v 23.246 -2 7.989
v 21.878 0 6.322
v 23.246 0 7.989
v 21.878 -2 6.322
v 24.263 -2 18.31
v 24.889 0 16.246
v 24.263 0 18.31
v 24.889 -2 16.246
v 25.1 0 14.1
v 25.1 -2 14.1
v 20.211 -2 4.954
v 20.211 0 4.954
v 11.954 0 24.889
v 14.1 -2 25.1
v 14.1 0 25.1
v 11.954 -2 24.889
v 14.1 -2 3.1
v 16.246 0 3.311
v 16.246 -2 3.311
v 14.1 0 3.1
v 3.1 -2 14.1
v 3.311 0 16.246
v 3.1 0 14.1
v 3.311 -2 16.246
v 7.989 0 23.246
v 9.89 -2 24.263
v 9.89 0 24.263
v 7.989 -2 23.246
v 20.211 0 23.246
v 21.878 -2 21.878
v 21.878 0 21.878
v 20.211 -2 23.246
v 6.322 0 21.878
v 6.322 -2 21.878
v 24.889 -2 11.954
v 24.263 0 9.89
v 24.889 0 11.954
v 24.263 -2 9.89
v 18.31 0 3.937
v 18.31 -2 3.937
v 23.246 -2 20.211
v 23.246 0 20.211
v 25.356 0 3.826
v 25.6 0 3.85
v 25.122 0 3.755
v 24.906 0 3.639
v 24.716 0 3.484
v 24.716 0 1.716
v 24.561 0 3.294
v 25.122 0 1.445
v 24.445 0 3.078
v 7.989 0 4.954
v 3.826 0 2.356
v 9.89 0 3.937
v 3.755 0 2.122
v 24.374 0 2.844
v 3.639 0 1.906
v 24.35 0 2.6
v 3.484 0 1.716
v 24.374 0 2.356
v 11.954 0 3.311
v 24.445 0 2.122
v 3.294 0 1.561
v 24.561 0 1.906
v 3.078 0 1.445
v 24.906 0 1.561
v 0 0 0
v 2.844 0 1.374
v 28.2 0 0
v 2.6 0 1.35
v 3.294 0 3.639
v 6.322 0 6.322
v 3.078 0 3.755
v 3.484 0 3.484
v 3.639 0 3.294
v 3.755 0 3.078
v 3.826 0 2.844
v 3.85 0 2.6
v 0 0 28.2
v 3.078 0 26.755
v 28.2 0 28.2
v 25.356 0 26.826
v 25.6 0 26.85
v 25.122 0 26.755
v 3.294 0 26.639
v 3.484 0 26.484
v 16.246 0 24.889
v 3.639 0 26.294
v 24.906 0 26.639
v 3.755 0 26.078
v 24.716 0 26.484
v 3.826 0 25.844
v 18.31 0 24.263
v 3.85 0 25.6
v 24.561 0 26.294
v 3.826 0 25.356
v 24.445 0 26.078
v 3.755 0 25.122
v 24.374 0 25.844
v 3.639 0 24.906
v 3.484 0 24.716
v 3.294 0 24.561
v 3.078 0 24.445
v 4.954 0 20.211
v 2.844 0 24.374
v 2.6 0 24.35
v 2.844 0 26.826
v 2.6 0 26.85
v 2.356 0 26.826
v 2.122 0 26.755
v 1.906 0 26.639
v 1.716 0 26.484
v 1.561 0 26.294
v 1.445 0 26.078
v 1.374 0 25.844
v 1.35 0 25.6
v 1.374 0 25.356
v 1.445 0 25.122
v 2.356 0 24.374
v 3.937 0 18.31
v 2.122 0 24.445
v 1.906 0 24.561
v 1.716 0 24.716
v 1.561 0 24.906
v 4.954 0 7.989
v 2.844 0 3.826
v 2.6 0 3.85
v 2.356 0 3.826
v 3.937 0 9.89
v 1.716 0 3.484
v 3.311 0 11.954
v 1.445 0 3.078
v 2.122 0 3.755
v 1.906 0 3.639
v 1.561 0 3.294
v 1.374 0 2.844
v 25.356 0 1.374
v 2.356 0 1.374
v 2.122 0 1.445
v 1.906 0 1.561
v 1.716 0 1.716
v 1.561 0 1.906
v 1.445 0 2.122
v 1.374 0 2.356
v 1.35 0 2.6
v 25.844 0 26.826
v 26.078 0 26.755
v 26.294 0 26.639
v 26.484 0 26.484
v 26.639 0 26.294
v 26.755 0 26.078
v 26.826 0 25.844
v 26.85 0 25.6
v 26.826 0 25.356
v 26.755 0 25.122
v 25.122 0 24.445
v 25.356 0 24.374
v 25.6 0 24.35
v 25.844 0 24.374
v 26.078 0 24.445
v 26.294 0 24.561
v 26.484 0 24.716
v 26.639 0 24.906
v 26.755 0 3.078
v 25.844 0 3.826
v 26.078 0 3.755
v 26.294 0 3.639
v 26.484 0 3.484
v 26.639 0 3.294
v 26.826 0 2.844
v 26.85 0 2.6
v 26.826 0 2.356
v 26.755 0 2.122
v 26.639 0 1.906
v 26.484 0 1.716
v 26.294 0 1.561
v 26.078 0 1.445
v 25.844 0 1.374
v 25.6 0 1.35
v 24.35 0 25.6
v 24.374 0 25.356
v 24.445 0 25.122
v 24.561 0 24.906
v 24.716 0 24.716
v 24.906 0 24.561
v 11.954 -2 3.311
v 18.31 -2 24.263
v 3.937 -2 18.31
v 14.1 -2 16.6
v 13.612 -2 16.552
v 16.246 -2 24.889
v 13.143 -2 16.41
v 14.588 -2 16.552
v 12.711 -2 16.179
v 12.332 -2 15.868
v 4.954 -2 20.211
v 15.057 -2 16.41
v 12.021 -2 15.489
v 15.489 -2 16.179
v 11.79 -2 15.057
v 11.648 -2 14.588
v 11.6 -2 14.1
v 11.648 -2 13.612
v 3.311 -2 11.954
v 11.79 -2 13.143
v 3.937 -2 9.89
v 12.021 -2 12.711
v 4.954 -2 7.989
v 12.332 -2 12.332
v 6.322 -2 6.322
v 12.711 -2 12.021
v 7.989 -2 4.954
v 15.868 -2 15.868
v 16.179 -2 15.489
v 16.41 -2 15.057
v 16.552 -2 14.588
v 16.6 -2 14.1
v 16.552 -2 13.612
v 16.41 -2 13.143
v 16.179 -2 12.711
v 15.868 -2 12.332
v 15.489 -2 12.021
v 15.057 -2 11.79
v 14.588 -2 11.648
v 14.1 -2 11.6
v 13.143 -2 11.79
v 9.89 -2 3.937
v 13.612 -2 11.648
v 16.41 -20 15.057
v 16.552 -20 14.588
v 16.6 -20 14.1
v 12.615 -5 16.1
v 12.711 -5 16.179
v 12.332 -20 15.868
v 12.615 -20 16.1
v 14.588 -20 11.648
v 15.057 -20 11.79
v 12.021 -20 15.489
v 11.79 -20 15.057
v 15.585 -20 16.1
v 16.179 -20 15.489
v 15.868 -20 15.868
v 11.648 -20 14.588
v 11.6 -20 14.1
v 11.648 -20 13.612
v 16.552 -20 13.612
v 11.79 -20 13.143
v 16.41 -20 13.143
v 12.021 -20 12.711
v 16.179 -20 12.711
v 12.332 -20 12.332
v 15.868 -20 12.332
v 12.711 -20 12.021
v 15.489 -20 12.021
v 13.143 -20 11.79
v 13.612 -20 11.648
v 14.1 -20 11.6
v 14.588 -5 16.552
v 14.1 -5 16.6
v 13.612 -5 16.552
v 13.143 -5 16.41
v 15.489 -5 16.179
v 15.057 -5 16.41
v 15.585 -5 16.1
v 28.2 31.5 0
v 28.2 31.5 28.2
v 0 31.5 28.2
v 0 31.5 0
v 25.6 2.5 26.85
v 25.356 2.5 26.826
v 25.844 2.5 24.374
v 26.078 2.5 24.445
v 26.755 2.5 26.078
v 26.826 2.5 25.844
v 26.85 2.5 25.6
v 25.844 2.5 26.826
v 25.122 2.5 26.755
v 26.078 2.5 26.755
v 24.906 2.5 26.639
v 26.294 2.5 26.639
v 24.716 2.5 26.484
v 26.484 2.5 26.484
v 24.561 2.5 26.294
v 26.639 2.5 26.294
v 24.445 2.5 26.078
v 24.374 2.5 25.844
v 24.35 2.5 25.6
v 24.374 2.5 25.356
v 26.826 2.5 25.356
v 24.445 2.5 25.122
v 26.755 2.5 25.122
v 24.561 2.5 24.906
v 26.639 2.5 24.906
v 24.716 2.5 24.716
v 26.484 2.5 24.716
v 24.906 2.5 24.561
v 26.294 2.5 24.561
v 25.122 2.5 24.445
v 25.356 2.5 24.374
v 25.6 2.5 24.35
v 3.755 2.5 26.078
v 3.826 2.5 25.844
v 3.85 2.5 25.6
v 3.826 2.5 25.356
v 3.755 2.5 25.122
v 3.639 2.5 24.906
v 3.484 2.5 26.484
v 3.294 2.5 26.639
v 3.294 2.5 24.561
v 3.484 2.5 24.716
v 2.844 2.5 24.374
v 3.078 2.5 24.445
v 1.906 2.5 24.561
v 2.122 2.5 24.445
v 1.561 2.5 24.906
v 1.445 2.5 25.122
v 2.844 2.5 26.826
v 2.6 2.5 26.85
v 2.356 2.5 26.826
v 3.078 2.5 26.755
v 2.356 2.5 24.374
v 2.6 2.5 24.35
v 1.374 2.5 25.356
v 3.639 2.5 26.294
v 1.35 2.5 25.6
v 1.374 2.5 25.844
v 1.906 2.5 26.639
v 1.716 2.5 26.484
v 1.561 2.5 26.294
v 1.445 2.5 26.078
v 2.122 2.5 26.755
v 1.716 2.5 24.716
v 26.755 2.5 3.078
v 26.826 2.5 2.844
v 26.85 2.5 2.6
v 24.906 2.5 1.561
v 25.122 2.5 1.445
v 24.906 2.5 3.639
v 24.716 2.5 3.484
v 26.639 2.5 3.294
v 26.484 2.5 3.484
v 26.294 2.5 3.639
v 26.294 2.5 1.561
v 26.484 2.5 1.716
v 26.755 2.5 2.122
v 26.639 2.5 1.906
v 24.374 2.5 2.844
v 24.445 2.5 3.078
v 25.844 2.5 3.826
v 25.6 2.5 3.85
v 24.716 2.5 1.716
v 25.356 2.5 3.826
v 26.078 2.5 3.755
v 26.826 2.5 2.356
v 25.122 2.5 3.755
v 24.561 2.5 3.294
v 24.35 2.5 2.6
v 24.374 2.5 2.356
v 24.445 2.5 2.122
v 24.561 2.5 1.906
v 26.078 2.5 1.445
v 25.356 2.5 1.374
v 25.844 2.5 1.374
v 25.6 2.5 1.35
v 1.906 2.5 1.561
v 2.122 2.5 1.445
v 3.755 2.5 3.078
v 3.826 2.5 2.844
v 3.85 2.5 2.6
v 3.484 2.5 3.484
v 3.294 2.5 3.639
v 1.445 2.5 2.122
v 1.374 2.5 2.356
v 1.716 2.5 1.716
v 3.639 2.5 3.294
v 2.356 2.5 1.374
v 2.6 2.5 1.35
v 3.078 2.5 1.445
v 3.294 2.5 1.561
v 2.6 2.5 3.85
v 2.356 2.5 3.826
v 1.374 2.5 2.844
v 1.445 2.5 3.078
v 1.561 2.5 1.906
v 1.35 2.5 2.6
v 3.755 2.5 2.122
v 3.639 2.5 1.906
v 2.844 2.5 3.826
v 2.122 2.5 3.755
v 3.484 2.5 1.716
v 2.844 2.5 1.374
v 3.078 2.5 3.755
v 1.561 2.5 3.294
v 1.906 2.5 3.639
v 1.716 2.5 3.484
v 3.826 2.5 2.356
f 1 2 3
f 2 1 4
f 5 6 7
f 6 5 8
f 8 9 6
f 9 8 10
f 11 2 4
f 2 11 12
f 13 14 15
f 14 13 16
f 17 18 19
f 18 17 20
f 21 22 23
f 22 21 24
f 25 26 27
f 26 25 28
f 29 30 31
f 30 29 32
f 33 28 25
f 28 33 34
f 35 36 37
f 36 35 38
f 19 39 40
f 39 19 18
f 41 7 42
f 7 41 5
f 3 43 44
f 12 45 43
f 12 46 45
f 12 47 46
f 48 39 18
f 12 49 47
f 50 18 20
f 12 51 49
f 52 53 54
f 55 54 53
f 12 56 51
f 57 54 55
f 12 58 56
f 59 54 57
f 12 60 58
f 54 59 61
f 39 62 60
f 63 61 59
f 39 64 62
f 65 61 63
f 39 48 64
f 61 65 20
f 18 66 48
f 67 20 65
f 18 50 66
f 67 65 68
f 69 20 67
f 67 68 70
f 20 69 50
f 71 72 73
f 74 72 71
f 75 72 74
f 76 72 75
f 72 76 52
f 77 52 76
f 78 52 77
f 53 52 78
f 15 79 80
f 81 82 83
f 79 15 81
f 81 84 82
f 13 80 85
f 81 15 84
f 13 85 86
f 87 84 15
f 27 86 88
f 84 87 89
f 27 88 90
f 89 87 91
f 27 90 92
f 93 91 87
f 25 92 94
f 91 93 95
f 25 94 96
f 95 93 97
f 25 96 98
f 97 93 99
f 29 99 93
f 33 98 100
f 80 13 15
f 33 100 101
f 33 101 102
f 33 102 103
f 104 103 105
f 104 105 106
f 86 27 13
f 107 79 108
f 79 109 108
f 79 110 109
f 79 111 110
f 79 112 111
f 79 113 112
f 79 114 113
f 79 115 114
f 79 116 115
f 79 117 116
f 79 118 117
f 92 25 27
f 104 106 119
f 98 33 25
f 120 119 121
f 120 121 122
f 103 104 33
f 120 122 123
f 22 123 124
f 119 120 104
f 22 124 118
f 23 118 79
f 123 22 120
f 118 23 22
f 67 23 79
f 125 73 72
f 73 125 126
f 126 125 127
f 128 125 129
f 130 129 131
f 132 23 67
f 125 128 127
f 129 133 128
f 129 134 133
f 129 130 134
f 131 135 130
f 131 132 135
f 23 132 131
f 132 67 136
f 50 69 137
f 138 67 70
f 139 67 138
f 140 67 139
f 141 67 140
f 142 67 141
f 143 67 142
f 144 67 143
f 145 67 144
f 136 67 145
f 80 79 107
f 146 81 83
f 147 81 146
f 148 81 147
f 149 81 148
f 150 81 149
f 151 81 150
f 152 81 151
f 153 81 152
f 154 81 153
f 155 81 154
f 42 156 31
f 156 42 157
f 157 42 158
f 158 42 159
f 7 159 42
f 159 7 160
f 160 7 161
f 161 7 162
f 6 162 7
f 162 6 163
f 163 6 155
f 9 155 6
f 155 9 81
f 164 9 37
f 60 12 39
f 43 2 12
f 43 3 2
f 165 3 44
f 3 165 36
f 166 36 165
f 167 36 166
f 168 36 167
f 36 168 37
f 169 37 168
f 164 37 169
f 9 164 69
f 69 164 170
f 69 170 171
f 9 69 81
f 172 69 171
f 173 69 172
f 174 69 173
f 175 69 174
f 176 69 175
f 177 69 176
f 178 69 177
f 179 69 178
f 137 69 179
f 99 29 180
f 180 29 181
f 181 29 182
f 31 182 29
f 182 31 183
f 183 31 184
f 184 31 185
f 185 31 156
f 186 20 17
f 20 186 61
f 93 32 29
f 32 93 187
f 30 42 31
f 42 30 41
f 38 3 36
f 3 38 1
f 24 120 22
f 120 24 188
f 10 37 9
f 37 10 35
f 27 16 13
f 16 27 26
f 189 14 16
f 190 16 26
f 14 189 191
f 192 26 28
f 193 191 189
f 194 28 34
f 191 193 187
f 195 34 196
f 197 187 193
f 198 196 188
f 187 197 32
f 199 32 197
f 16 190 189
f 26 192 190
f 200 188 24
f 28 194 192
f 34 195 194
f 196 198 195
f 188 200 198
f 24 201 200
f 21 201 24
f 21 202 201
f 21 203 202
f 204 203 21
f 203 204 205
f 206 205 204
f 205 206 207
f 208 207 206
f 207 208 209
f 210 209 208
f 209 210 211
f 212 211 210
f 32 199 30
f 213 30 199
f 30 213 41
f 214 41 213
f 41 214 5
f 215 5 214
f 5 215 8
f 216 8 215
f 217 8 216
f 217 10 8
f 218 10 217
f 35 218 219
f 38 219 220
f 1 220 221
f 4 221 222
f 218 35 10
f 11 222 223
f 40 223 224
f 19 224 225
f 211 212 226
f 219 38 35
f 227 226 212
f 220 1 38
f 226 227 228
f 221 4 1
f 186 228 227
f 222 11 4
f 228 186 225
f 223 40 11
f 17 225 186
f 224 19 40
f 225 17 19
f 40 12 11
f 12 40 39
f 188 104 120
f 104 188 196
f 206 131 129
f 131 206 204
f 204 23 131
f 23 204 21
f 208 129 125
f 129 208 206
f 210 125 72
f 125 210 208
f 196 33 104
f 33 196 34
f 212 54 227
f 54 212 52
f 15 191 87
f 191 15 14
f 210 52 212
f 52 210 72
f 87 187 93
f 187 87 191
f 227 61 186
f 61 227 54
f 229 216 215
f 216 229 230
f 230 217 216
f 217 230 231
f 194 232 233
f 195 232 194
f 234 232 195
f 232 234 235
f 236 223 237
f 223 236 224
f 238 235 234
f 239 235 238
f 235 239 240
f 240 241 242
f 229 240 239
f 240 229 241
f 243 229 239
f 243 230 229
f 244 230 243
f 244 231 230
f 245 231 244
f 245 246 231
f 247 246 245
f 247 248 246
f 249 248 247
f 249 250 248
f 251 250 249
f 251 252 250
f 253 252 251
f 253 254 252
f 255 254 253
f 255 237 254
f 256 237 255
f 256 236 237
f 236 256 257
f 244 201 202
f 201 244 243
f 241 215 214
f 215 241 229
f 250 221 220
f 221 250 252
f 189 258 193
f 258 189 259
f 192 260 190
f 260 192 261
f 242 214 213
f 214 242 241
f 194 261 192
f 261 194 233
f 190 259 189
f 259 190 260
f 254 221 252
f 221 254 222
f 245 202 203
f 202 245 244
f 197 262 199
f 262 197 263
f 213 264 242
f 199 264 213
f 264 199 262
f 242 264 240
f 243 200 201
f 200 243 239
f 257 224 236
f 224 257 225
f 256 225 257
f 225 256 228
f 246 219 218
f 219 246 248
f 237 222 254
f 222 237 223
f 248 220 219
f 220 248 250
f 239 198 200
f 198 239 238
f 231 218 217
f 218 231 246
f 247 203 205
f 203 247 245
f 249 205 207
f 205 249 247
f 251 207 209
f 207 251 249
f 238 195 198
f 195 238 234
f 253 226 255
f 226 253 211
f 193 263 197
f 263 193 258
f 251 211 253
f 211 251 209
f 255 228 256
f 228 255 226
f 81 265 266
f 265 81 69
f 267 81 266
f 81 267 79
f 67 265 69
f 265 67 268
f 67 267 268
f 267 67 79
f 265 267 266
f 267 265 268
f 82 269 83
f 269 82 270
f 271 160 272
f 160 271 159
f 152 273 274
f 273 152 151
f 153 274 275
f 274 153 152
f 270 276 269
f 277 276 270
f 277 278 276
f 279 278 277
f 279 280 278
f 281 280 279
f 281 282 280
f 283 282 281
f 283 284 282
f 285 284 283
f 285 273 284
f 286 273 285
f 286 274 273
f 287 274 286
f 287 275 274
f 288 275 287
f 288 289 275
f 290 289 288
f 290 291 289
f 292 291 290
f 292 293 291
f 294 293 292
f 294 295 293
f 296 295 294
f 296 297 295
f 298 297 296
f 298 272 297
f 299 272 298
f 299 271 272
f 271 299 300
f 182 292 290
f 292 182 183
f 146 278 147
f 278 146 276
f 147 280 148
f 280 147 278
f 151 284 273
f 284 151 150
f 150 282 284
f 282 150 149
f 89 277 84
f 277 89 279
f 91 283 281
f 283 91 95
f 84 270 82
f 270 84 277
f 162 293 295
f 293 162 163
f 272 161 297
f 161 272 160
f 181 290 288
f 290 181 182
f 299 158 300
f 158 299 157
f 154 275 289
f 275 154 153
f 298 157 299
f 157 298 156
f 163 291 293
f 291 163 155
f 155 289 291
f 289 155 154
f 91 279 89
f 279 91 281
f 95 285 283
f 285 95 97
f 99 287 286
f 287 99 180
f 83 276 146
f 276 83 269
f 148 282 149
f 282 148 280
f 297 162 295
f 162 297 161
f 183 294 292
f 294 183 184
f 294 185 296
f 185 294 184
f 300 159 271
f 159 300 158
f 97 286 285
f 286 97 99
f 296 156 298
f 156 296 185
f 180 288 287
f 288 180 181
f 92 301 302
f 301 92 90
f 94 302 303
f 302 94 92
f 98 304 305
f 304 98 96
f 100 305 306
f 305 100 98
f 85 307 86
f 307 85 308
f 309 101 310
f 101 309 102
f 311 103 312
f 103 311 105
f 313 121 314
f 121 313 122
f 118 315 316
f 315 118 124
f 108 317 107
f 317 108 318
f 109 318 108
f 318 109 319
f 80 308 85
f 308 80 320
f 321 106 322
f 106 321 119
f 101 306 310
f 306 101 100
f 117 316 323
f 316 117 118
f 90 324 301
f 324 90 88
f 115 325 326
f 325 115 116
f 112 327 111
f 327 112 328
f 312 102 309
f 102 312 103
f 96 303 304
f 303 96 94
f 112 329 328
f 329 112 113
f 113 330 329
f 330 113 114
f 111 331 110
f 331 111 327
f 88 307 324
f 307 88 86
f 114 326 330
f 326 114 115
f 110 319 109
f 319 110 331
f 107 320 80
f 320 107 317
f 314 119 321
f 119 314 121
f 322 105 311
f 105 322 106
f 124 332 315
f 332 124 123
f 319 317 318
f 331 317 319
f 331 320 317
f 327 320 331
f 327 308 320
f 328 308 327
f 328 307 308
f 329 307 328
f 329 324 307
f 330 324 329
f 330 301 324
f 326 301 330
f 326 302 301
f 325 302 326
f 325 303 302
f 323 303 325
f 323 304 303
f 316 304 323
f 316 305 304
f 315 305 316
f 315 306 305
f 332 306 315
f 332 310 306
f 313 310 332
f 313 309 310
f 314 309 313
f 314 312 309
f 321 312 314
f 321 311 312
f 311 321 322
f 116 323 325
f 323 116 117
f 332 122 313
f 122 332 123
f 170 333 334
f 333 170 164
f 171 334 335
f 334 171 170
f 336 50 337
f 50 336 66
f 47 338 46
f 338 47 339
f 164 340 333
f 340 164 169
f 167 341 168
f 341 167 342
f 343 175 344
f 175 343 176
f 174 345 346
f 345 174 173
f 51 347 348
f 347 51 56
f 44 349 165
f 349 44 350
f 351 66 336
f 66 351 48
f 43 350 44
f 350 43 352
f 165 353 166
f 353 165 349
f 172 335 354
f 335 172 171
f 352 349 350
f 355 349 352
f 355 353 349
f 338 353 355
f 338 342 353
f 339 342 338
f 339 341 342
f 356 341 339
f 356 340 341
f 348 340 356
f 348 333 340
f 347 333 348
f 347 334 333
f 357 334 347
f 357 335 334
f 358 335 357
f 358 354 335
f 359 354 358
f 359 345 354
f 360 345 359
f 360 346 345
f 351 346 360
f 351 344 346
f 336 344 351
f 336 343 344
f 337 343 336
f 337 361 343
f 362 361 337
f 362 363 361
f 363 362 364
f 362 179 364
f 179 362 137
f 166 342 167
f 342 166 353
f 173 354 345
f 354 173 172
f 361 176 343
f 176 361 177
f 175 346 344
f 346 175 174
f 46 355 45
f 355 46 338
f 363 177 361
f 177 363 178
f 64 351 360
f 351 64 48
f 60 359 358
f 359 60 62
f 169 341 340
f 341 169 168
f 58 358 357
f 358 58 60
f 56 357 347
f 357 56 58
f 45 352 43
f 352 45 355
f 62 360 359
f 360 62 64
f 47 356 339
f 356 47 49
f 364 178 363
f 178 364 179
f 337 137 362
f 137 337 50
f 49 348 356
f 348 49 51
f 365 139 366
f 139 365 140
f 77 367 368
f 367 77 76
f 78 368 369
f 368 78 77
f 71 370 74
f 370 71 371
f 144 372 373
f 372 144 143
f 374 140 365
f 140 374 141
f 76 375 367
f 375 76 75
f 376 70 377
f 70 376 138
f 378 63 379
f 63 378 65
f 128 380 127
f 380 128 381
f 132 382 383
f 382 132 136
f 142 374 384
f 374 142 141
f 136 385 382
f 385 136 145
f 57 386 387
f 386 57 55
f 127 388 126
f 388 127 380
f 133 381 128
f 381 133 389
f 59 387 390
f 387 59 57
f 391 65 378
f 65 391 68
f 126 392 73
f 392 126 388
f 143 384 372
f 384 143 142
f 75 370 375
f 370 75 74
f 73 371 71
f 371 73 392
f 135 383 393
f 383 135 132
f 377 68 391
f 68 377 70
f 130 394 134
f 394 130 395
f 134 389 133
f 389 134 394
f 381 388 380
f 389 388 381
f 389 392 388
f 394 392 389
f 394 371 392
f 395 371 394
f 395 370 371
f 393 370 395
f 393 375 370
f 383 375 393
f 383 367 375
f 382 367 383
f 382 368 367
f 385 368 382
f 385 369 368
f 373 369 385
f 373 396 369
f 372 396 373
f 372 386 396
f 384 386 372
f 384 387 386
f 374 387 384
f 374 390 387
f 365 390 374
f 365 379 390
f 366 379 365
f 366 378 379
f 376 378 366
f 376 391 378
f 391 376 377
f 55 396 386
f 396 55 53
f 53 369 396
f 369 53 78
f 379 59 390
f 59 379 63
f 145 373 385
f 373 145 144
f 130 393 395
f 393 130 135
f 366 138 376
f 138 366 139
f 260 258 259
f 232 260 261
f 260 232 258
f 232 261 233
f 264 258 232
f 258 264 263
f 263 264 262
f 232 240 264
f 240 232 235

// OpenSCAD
// WeePrusa
// Stepper Motors
// GNU GPL v3
// Thomas Phillips (tntexplosivesltd@gmail.com)
// https://github.com/tntexplosivesltd/WeePrusa

$fn = 32;

// Colours
black = [12/255, 12/255, 12/255];
grey = [200/255, 200/255, 200/255];

// Motor back
width = 28.2;
torque = 6;

// Shaft
shaft = 20;
shaft_radius = 2.5;
keyway = 15;
hub_radius = 11;
hub_width = 2;

// Screws
screw_size = 2.5;
screw_depth = 2.5;
screw_separation = 23;

function get_length(t) = lookup(t, [
			[4.3, 31.5],
			[6, 31.5],
			[7.5, 44.5],
			[9, 50.5],
			[9.5, 44.5],
			[12, 50.5],
	]);

length = get_length(torque);

difference()
{
	union()
	{
		color (black) cube ([width, length, width], center = false);
		color (grey)
		{
			translate ([width/2, 0, width/2])
			{
				rotate ([90,0,0]) cylinder (h = hub_width, r1 = hub_radius, r2 = hub_radius, center = false);
				rotate ([90,0,0]) cylinder (h = shaft, r1 = shaft_radius, r2 = shaft_radius, center = false);
			}
		}
	}
	
	color (grey)
	{
		translate([width/2, screw_depth, width/2])
		{
			// screw holes
			translate ([screw_separation/2, 0, screw_separation/2]) rotate ([90,0,0])
				cylinder (h = screw_depth+1, r1 = screw_size/2, r2 = screw_size/2, center = false);
			translate ([-screw_separation/2, 0, screw_separation/2]) rotate ([90,0,0])
				cylinder (h = screw_depth+1, r1 = screw_size/2, r2 = screw_size/2, center = false);
			translate ([screw_separation/2, 0, -screw_separation/2]) rotate ([90,0,0])
				cylinder (h = screw_depth+1, r1 = screw_size/2, r2 = screw_size/2, center = false);
			translate ([-screw_separation/2, 0, -screw_separation/2]) rotate ([90,0,0])
				cylinder (h = screw_depth+1, r1 = screw_size/2, r2 = screw_size/2, center = false);

			// flat on shaft
			rotate ([90,0,0]) translate ([-shaft_radius, shaft_radius-0.5, shaft+screw_depth-keyway]) 
				cube ([5, 0.5, keyway+1], center = false);
		}
	}
}
